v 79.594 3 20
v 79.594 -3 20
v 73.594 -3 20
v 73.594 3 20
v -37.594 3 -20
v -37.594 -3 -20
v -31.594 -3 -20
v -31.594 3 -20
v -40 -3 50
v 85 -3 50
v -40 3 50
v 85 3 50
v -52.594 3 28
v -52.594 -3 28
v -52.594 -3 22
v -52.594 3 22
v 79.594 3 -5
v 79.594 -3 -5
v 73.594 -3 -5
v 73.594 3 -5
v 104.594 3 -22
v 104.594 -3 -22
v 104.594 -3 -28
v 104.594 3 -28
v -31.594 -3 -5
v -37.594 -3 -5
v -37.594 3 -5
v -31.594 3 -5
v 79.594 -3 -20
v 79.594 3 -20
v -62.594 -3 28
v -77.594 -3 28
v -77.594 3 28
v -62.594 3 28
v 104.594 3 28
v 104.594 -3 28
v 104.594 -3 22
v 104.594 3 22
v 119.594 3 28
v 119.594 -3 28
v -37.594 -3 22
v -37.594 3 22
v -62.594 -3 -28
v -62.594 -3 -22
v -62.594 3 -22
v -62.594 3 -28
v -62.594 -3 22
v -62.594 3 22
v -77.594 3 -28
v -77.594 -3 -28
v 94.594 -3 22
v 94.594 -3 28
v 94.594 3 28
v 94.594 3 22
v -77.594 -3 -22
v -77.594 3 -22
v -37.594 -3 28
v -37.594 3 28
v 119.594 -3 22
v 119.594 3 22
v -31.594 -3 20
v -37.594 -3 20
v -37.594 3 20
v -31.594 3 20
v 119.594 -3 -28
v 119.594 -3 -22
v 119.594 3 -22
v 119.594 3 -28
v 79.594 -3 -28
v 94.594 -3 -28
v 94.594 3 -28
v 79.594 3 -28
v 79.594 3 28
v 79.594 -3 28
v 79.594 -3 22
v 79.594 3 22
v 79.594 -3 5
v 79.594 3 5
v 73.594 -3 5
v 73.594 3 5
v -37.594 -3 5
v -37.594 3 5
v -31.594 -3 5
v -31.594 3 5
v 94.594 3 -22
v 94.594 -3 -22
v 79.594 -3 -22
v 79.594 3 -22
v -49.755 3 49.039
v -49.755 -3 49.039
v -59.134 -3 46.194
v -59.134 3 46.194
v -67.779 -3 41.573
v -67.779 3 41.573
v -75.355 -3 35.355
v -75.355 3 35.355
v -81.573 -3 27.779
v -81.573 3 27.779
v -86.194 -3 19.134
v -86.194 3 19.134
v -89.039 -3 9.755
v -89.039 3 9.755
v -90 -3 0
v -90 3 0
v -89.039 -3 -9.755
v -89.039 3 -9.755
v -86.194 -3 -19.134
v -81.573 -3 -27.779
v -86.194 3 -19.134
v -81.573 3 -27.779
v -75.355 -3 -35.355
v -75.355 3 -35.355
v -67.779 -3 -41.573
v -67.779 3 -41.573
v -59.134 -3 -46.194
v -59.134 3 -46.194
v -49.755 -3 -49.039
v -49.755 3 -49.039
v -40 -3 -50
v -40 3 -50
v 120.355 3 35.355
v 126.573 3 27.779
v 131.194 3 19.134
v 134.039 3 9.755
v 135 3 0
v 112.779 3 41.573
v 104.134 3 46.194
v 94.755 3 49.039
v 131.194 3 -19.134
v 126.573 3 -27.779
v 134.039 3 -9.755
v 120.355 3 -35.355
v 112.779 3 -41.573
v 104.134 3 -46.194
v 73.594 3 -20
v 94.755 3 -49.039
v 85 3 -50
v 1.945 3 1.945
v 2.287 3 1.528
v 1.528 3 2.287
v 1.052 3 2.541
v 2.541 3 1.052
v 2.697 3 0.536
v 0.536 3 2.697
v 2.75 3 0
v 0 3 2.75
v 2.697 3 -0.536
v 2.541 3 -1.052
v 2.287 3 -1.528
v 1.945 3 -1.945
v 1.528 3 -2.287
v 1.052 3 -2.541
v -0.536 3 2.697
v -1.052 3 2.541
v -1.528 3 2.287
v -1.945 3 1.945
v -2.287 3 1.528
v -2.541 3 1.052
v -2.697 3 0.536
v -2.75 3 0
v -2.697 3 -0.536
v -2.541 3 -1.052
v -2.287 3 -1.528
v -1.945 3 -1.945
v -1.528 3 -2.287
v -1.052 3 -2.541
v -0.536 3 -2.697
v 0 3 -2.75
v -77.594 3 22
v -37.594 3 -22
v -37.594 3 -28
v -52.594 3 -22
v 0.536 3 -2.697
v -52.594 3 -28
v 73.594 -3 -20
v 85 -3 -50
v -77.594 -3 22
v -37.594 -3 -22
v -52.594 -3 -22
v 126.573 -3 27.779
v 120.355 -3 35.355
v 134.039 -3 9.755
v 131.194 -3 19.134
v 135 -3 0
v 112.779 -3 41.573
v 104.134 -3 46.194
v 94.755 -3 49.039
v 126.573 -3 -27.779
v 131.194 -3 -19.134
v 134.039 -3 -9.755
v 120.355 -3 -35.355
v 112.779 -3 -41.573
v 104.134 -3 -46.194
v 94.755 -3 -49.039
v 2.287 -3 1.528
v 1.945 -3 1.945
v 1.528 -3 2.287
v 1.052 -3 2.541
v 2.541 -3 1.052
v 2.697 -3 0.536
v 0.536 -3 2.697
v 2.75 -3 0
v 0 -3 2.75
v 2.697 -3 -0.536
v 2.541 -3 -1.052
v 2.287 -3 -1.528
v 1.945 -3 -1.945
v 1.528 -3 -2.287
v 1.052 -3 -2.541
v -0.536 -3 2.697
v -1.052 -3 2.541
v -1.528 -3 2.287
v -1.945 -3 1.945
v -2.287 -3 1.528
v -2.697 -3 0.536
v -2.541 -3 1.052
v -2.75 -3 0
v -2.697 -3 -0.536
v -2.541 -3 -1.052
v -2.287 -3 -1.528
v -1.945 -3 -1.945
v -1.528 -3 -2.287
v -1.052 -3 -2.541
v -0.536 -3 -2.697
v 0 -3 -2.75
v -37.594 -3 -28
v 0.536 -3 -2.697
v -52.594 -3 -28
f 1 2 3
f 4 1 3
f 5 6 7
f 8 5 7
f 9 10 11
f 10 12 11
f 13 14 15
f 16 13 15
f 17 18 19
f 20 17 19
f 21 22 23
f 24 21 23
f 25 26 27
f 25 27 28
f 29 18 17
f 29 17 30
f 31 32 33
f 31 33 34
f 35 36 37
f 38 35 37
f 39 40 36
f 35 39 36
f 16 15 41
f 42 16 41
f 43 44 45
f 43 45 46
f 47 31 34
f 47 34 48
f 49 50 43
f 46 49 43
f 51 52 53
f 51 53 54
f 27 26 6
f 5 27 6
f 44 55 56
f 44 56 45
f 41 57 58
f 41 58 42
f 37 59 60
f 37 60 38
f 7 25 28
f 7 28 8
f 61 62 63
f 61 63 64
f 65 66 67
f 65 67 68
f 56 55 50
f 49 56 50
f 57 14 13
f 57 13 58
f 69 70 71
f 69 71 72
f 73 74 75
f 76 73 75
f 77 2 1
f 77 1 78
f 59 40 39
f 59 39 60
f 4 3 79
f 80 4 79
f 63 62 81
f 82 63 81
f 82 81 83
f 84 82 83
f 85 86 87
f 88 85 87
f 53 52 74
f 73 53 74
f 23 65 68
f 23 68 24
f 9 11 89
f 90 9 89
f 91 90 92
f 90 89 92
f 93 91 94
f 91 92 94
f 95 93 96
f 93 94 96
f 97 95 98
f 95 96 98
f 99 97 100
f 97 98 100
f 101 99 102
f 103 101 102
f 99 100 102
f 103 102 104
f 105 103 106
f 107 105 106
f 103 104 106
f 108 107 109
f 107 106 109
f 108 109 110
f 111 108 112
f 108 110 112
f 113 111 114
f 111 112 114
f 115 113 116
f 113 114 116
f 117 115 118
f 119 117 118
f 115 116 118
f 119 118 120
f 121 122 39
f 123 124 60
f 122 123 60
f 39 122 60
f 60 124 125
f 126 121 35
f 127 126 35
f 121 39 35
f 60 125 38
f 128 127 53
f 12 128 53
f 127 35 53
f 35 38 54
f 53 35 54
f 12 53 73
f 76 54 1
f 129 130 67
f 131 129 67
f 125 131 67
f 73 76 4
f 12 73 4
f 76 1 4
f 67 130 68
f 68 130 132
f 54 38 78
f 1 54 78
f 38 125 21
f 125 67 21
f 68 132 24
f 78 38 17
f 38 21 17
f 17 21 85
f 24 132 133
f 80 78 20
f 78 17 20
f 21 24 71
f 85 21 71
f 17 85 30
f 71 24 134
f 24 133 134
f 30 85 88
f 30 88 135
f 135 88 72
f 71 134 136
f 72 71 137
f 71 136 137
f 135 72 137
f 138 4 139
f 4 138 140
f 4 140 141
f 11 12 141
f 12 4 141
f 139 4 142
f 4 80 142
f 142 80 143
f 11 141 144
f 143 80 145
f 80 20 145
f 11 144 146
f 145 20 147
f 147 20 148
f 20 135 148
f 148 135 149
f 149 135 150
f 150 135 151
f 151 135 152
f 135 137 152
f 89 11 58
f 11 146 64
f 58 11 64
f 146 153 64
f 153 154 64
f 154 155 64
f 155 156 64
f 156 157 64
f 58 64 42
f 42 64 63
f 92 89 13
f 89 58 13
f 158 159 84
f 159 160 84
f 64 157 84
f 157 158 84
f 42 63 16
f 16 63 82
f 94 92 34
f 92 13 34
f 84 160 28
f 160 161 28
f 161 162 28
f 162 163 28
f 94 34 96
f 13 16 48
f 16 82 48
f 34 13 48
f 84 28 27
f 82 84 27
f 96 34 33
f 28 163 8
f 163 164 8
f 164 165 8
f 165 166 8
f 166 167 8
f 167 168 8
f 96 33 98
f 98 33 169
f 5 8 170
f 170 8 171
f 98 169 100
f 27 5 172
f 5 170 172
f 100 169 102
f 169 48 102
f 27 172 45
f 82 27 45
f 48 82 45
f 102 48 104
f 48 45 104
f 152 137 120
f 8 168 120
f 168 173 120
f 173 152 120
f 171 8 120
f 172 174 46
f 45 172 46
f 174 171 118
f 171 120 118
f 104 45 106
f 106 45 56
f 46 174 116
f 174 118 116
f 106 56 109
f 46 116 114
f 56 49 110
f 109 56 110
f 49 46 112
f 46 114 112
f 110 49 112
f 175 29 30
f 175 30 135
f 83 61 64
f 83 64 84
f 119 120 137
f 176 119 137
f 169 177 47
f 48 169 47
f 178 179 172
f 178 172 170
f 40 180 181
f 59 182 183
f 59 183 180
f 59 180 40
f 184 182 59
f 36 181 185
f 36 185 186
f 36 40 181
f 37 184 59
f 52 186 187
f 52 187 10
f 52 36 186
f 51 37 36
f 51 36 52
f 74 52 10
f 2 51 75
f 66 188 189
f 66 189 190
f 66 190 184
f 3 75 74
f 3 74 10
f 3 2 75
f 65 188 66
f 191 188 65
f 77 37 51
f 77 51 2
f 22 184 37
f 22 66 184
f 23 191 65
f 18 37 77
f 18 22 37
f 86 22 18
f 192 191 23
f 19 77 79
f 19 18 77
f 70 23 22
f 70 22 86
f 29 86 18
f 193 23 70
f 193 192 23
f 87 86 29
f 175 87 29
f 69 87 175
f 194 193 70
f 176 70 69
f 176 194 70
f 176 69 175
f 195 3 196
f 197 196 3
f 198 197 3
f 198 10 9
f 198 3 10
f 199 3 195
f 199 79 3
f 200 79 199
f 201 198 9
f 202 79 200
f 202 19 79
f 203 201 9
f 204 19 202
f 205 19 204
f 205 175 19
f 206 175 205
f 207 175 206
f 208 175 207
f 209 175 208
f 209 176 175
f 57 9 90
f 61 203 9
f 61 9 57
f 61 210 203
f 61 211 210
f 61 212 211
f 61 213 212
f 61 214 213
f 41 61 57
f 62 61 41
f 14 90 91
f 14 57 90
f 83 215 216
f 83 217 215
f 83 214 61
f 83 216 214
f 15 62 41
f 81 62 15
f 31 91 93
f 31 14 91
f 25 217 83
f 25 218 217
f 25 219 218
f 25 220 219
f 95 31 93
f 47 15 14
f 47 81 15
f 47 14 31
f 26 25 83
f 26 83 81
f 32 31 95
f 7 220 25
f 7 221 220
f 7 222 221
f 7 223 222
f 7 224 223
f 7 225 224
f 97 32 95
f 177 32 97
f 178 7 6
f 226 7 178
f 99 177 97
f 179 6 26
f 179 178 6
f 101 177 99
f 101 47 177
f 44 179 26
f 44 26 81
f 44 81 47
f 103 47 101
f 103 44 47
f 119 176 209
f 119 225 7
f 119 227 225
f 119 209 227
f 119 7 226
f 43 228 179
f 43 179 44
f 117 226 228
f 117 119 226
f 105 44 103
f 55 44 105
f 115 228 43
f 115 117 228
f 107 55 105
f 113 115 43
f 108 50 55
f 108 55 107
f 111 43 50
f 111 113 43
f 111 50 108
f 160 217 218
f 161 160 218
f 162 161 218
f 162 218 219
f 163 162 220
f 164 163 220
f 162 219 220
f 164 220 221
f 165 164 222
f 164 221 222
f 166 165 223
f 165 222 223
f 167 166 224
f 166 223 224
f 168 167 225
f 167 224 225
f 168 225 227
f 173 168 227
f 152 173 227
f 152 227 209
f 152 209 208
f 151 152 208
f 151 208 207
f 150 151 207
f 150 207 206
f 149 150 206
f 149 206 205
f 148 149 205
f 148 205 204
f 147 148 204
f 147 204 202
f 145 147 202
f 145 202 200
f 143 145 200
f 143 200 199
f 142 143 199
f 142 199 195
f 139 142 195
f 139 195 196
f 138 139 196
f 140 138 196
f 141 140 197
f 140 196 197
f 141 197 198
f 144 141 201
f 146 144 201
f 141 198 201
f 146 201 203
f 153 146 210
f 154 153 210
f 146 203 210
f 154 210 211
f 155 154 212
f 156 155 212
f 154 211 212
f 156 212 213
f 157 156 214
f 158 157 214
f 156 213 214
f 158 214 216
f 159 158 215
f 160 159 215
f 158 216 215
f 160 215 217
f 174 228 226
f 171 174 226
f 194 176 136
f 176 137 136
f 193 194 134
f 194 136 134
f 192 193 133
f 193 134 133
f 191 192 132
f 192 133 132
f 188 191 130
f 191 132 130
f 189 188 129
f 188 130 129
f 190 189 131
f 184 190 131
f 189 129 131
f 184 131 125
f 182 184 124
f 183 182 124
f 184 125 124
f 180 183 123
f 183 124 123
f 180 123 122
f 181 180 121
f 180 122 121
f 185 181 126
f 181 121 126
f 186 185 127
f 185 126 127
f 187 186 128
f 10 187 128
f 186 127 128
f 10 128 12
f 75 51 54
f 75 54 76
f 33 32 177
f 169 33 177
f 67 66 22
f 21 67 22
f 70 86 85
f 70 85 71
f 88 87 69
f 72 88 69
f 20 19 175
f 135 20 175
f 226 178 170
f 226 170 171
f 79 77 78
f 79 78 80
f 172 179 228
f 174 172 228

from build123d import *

# Parameters (mm, degrees)
SALIENTE_EXTRUIR1_DEPTH      = 3
TALADRO_DE_MARGEN_PARA_M51_D = 5.5
CROQUIS7_W                   = 15
CROQUIS7_H                   = 6
CROQUIS7_W_2                 = 6
CROQUIS7_H_2                 = 15
CORTAR_EXTRUIR1_DEPTH        = 145.086779407


with BuildPart() as part:
    # Croquis1 → Saliente-Extruir1 (new, symmetric)
    with BuildSketch(Plane(origin=(0, 0, 0), x_dir=(1, 0, 0), z_dir=(0, 1, 0))):
        with BuildLine():
            Line((-40, 50), (85, 50))
            ThreePointArc((85, 50), (135, 0), (85, -50))
            Line((85, -50), (-40, -50))
            ThreePointArc((-40, -50), (-90, 0), (-40, 50))
        make_face()
    extrude(amount=SALIENTE_EXTRUIR1_DEPTH, both=True)

    # Taladro de margen para M51 (through all)
    with Locations(Plane(origin=(0, 3, 0), x_dir=(1, 0, 0), z_dir=(0, 1, 0))):
        with Locations((0, 0)):
            Hole(TALADRO_DE_MARGEN_PARA_M51_D / 2)

    # Croquis7 → Cortar-Extruir1 (cut, through all)
    with BuildSketch(Plane(origin=(0, -3, 0), x_dir=(-1, 0, 0), z_dir=(0, -1, 0))):
        with Locations((-87.09375, -25)):
            Rectangle(CROQUIS7_W, CROQUIS7_H)
        with Locations((-112.09375, -25)):
            Rectangle(CROQUIS7_W, CROQUIS7_H)
        with Locations((-112.09375, 25)):
            Rectangle(CROQUIS7_W, CROQUIS7_H)
        with Locations((-87.09375, 25)):
            Rectangle(CROQUIS7_W, CROQUIS7_H)
        with Locations((-76.59375, -12.5)):
            Rectangle(CROQUIS7_W_2, CROQUIS7_H_2)
        with Locations((-76.59375, 12.5)):
            Rectangle(CROQUIS7_W_2, CROQUIS7_H_2)
    cortar_extruir1 = extrude(amount=-CORTAR_EXTRUIR1_DEPTH, mode=Mode.SUBTRACT)

    # Simetría1: Cortar-Extruir1 across plane
    add(cortar_extruir1.mirror(Plane(origin=(21, 0, 0), x_dir=(0, 0, 1), z_dir=(1, 0, 0))), mode=Mode.SUBTRACT)


solid = part.part
